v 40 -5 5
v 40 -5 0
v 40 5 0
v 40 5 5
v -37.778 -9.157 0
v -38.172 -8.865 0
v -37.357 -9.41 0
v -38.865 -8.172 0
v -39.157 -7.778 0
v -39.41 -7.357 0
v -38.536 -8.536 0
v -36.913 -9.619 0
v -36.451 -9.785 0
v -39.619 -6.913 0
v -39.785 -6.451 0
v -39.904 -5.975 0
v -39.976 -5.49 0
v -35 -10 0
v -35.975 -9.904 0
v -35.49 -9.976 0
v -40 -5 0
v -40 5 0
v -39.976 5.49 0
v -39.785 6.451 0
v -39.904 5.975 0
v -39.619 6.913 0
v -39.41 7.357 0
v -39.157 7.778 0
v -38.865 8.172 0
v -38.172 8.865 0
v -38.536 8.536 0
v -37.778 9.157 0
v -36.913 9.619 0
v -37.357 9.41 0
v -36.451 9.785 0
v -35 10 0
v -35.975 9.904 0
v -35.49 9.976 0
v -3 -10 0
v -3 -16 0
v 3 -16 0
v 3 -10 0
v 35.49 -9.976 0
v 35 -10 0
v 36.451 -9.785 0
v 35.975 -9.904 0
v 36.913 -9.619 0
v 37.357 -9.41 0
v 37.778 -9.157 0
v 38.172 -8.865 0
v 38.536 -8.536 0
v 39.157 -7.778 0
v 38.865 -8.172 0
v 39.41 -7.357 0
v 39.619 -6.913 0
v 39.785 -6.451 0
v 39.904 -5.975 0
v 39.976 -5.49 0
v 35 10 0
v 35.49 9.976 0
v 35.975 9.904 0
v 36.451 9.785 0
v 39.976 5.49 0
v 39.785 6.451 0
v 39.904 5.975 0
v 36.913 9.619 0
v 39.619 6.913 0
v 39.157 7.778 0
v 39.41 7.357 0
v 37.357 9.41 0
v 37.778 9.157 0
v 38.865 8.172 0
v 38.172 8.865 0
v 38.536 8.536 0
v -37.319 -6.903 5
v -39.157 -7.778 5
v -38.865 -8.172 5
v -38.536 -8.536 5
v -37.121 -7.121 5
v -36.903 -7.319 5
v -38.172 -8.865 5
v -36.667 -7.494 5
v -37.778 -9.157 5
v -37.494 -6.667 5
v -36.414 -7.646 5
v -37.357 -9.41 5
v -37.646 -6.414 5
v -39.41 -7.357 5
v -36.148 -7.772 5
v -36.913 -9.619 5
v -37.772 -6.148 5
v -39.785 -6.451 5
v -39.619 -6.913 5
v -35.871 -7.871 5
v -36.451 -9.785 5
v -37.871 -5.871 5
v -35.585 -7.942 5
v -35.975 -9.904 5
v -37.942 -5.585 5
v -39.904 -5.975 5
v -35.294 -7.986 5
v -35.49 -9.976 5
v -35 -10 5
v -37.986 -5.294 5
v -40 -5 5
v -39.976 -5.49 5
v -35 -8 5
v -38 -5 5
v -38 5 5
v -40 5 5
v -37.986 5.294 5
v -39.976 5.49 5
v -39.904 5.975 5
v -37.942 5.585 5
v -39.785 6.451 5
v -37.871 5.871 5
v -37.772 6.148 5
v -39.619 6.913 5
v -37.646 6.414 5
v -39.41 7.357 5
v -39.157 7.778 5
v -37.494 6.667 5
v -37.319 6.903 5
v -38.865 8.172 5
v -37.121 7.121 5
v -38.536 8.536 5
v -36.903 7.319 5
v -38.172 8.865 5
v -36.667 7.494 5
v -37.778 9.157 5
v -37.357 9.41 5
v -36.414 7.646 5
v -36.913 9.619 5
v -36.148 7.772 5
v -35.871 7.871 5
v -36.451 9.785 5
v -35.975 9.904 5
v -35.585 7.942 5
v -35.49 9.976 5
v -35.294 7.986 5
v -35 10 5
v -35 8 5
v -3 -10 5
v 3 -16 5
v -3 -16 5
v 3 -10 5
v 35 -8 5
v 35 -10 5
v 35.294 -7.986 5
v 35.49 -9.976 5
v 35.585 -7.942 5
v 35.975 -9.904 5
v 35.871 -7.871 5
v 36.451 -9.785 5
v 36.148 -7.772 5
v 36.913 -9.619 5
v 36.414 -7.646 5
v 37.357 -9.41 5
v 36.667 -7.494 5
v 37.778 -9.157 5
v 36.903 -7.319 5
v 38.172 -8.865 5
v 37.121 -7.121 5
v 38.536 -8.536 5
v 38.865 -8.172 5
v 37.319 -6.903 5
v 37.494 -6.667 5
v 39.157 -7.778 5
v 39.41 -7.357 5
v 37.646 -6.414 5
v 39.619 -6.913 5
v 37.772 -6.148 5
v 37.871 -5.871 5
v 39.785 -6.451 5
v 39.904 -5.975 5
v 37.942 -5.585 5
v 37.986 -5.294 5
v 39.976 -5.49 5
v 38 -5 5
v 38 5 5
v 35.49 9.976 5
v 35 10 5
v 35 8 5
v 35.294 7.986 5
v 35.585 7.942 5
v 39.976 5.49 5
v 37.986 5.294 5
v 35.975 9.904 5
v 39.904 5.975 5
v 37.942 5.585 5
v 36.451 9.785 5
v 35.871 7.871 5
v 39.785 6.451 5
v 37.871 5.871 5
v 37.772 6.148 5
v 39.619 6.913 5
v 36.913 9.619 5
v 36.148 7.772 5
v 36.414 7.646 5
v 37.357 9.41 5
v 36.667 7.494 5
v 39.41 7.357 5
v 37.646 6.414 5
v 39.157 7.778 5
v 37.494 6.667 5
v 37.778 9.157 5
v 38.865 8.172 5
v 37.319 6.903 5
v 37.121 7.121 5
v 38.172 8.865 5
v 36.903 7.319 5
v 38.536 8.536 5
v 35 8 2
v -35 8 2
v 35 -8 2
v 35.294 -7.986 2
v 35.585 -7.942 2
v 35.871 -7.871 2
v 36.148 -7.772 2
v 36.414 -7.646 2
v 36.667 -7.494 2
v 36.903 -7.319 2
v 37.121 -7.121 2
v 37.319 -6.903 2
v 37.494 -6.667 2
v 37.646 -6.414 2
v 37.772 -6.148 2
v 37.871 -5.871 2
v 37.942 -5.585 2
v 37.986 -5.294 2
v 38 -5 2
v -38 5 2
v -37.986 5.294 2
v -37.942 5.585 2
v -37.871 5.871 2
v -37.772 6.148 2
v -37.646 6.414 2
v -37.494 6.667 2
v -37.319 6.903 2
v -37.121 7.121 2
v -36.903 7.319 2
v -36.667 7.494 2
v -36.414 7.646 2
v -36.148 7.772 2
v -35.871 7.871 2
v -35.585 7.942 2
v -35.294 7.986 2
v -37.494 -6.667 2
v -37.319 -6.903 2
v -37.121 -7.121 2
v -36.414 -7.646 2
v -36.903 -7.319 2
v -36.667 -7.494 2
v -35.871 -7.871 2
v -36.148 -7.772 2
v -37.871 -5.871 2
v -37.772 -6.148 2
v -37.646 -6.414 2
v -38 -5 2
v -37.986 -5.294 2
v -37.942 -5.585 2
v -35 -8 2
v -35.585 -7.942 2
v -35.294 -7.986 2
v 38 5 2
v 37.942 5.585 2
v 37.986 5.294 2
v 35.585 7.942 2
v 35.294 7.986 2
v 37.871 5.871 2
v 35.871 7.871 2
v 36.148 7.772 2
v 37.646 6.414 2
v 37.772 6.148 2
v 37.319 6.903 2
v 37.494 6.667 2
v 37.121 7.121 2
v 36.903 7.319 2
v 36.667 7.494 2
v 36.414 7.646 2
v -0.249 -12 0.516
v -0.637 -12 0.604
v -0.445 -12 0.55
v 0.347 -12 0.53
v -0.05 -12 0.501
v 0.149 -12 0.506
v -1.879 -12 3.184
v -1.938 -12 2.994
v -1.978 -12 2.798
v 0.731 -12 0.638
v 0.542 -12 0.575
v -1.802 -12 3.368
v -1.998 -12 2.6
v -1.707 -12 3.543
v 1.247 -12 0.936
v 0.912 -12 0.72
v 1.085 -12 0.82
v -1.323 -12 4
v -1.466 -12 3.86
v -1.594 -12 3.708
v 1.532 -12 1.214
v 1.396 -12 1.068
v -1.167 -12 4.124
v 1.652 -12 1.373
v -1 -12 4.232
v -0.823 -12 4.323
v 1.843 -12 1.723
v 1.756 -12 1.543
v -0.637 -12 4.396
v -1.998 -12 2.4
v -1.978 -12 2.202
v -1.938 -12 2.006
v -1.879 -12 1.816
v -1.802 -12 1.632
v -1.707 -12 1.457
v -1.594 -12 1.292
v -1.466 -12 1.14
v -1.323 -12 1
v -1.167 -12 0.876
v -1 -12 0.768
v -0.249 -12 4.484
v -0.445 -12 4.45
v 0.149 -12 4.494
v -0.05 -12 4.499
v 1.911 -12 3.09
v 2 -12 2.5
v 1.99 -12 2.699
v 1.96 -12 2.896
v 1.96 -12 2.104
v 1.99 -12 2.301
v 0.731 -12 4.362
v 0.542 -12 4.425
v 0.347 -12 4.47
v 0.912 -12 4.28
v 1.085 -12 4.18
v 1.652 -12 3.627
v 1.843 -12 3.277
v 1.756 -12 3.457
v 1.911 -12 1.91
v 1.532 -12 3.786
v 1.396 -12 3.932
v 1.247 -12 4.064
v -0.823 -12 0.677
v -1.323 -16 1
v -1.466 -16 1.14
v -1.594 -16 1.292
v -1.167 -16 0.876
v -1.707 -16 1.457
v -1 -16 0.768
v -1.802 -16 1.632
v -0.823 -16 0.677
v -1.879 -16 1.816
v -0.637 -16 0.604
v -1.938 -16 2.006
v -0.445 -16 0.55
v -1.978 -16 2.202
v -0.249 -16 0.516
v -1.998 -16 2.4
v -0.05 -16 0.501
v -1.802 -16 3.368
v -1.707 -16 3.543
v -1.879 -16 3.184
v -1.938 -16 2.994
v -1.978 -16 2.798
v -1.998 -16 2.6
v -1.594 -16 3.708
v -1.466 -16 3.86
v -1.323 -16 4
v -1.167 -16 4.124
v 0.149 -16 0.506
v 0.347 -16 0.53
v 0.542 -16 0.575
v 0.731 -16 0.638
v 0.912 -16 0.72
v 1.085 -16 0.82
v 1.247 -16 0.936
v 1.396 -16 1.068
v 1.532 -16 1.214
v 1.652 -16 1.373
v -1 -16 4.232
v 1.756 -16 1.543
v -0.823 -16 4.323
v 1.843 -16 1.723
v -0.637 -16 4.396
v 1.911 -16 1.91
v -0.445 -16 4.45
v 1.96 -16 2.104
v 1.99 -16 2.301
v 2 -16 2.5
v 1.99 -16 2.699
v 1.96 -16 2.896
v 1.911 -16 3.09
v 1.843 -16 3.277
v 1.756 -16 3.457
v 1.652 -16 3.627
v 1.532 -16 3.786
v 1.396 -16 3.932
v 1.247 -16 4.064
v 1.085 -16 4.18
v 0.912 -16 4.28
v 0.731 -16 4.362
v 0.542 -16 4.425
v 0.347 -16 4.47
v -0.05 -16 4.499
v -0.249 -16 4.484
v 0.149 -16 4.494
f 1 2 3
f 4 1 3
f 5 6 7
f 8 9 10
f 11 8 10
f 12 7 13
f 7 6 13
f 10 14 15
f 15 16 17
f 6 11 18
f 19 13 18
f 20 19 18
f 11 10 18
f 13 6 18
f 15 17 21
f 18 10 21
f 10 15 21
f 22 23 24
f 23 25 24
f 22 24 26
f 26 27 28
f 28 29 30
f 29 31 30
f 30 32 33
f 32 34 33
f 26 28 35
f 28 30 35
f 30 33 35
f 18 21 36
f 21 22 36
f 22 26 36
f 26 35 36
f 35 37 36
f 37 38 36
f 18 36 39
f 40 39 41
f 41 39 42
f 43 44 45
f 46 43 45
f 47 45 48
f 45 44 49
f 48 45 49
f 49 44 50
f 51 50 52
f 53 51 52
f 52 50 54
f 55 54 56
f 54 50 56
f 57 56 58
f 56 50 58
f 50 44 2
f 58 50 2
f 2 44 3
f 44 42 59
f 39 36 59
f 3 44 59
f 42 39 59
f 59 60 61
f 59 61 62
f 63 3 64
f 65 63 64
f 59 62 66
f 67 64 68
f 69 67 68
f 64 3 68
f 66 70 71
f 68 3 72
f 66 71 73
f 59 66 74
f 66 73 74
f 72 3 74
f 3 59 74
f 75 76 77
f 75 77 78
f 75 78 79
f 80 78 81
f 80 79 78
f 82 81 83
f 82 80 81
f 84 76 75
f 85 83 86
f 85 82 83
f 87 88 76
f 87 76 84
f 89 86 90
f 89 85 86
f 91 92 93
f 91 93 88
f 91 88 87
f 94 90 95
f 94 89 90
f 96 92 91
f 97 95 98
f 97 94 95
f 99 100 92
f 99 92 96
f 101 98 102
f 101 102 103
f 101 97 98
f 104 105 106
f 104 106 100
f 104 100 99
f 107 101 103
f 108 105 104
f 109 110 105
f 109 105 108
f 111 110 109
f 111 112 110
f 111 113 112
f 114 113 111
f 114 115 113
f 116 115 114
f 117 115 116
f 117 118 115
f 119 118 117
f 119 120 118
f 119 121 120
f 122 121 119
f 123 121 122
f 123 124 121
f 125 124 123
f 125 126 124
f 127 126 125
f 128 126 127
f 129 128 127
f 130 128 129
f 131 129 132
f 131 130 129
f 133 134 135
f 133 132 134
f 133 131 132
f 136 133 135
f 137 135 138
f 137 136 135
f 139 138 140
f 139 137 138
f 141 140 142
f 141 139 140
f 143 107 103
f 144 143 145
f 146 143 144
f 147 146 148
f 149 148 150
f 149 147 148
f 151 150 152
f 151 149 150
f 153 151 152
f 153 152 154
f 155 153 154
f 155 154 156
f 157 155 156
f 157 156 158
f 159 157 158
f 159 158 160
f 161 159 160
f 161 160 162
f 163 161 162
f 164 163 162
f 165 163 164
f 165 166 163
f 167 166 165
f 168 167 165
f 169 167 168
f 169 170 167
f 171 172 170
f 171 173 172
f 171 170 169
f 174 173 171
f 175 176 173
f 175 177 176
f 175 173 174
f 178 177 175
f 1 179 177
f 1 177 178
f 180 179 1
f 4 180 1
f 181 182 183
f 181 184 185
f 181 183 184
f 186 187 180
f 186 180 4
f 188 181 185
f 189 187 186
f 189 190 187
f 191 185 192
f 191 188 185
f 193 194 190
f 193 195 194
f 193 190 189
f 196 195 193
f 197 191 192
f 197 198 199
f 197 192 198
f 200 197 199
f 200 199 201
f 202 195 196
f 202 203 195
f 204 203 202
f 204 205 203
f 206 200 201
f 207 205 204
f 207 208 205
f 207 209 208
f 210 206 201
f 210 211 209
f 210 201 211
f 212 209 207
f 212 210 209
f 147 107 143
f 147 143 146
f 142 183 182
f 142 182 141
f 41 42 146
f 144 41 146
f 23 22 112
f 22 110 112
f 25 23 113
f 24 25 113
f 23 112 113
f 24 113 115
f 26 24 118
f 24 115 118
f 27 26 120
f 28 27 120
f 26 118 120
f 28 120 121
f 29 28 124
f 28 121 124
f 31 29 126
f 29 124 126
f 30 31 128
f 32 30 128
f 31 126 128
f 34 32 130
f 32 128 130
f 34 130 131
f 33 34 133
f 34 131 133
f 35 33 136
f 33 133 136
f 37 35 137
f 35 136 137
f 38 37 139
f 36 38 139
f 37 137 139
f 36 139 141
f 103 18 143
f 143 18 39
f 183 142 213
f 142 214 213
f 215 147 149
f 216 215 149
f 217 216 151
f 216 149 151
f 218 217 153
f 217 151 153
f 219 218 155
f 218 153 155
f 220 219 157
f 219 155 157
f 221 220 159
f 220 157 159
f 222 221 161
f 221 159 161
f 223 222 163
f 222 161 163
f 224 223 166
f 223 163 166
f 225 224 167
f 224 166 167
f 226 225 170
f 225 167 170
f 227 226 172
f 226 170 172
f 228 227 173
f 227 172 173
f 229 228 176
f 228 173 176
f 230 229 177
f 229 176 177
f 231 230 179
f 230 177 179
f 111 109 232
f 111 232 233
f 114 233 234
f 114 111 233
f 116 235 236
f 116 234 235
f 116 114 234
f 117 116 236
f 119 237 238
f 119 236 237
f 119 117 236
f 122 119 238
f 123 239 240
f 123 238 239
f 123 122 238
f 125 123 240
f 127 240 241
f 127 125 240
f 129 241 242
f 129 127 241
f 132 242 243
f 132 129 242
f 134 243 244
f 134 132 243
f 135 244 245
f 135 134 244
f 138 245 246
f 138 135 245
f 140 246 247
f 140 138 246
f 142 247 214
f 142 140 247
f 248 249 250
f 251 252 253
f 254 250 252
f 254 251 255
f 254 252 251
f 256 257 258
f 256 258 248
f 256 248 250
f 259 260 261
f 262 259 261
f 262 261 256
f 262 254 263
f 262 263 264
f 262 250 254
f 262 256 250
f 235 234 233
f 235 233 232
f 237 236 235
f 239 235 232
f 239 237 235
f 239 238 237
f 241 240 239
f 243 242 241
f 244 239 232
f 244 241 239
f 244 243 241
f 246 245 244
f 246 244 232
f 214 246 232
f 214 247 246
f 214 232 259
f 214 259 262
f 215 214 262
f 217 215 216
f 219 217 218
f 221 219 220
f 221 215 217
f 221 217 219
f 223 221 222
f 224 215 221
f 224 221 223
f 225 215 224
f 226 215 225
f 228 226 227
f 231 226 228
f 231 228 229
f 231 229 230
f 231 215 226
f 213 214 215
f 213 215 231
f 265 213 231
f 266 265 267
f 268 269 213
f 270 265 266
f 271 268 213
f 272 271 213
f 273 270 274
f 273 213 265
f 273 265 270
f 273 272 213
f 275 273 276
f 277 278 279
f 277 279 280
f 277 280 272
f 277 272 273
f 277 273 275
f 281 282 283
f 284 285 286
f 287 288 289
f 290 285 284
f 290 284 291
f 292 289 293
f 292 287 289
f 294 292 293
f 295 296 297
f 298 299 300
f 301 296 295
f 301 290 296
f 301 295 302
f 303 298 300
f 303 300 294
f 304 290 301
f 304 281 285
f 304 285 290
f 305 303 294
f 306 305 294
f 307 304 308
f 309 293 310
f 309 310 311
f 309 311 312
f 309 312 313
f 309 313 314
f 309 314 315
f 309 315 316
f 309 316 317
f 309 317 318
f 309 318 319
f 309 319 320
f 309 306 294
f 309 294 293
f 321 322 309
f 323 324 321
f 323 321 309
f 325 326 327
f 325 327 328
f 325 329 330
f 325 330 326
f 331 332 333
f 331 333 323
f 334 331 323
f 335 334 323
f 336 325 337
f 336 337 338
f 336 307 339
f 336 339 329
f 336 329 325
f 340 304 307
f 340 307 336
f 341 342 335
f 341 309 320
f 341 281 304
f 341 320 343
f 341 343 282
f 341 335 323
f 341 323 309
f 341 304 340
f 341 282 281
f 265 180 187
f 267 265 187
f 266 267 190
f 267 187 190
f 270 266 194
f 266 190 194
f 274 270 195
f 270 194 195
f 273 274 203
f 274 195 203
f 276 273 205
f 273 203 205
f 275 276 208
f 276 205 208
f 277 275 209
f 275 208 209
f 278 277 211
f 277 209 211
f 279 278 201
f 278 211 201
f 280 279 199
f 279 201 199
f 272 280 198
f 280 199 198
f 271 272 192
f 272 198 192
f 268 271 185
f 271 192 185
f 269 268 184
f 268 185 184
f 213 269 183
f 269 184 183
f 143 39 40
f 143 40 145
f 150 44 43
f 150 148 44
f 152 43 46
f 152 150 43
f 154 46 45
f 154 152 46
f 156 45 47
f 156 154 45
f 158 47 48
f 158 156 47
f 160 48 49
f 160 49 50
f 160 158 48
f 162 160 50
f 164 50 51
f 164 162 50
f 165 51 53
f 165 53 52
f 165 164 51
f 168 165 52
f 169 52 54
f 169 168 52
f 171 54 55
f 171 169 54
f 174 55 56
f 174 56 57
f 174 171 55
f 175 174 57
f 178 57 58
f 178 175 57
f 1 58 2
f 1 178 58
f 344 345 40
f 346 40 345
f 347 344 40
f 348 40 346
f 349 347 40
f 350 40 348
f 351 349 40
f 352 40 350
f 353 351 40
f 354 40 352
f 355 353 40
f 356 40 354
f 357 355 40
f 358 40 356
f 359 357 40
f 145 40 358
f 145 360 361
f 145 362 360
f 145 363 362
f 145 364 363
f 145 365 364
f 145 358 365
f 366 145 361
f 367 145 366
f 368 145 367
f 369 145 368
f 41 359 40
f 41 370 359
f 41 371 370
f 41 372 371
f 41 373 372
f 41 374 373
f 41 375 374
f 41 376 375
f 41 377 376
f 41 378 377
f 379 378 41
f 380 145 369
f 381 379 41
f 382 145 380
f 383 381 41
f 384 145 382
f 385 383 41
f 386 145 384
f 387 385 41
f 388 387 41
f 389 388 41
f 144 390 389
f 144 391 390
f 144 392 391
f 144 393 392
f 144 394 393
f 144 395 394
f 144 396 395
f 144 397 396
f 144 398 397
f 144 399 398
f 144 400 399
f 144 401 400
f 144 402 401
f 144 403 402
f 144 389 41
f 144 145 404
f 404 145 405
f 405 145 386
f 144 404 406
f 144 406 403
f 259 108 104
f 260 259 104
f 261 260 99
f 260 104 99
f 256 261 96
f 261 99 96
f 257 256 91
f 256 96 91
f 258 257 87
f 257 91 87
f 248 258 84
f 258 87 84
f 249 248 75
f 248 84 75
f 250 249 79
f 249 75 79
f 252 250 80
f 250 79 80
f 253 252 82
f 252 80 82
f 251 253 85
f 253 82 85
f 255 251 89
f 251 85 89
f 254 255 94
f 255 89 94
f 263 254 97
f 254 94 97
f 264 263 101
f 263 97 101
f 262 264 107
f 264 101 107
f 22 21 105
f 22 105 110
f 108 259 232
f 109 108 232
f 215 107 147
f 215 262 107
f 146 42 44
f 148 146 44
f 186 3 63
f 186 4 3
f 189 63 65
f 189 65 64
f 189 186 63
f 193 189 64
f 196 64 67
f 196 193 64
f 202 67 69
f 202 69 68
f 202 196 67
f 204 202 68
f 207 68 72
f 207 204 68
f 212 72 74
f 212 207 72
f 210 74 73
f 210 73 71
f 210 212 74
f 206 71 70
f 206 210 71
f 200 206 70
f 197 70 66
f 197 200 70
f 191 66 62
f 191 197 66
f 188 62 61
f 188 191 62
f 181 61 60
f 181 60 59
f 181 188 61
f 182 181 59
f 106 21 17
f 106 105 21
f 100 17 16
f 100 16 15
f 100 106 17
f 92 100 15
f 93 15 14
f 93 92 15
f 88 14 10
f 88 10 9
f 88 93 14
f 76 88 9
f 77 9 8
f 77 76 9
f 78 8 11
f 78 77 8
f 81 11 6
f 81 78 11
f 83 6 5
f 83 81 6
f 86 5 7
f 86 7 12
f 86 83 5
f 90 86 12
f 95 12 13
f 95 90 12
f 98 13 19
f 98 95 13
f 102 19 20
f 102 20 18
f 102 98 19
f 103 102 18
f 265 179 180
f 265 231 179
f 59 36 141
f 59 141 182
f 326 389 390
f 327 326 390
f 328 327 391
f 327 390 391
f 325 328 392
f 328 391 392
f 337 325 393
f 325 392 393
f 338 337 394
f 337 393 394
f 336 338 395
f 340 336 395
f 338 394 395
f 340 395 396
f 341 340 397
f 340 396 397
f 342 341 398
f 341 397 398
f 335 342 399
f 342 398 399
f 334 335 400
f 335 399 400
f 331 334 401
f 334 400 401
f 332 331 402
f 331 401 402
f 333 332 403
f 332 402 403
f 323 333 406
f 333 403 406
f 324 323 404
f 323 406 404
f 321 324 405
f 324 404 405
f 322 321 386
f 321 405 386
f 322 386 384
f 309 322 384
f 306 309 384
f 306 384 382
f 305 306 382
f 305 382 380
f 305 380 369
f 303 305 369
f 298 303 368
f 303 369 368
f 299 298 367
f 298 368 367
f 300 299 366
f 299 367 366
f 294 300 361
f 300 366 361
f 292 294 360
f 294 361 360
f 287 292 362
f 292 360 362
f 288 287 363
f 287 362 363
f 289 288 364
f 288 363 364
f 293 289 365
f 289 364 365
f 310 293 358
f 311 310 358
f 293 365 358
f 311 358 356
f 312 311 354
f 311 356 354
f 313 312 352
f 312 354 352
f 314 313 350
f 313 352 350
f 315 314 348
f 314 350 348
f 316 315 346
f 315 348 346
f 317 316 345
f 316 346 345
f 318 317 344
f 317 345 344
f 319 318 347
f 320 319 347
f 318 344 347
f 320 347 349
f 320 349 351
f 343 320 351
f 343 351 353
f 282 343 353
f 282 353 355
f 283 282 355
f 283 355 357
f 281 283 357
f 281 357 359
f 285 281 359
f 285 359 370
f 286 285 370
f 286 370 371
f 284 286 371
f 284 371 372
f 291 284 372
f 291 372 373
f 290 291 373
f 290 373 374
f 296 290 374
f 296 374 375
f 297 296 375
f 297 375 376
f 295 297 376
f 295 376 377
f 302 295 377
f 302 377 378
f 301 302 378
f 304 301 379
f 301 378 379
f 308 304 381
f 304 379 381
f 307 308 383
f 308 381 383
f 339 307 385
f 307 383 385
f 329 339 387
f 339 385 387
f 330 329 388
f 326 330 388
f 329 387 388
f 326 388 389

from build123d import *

# Parameters (mm, degrees)
SKETCH1_W           = 80
SKETCH1_H           = 20
BOSS_EXTRUDE1_DEPTH = 5
FILLET1_R           = 5
SHELL1_T            = -2
SKETCH3_W           = 6
SKETCH3_H           = 5
BOSS_EXTRUDE2_DEPTH = 6
SKETCH4_R           = 2
CUT_EXTRUDE1_DEPTH  = 4


with BuildPart() as part:
    # Sketch1 → Boss-Extrude1 (new body)
    with BuildSketch(Plane.XY):
        Rectangle(SKETCH1_W, SKETCH1_H)
    extrude(amount=BOSS_EXTRUDE1_DEPTH)

    # Fillet1
    fillet1_edges = [part.edges().sort_by_distance(p)[0] for p in [
        (-40, 10, 2.5),
        (40, 10, 2.5),
        (40, -10, 2.5),
        (-40, -10, 2.5),
    ]]
    fillet(fillet1_edges, radius=FILLET1_R)

    # Shell1
    shell1_openings = [part.faces().sort_by_distance(p)[0] for p in [
        (0, 0, 5),
    ]]
    offset(amount=SHELL1_T, openings=shell1_openings, kind=Kind.INTERSECTION)

    # Sketch3 → Boss-Extrude2 (add)
    with BuildSketch(Plane.XZ.offset(10)):
        with Locations((0, 2.5)):
            Rectangle(SKETCH3_W, SKETCH3_H)
    extrude(amount=BOSS_EXTRUDE2_DEPTH)

    # Sketch4 → Cut-Extrude1 (cut)
    with BuildSketch(Plane.XZ.offset(16)):
        with Locations((0, 2.5)):
            Circle(SKETCH4_R)
    extrude(amount=-CUT_EXTRUDE1_DEPTH, mode=Mode.SUBTRACT)


solid = part.part
